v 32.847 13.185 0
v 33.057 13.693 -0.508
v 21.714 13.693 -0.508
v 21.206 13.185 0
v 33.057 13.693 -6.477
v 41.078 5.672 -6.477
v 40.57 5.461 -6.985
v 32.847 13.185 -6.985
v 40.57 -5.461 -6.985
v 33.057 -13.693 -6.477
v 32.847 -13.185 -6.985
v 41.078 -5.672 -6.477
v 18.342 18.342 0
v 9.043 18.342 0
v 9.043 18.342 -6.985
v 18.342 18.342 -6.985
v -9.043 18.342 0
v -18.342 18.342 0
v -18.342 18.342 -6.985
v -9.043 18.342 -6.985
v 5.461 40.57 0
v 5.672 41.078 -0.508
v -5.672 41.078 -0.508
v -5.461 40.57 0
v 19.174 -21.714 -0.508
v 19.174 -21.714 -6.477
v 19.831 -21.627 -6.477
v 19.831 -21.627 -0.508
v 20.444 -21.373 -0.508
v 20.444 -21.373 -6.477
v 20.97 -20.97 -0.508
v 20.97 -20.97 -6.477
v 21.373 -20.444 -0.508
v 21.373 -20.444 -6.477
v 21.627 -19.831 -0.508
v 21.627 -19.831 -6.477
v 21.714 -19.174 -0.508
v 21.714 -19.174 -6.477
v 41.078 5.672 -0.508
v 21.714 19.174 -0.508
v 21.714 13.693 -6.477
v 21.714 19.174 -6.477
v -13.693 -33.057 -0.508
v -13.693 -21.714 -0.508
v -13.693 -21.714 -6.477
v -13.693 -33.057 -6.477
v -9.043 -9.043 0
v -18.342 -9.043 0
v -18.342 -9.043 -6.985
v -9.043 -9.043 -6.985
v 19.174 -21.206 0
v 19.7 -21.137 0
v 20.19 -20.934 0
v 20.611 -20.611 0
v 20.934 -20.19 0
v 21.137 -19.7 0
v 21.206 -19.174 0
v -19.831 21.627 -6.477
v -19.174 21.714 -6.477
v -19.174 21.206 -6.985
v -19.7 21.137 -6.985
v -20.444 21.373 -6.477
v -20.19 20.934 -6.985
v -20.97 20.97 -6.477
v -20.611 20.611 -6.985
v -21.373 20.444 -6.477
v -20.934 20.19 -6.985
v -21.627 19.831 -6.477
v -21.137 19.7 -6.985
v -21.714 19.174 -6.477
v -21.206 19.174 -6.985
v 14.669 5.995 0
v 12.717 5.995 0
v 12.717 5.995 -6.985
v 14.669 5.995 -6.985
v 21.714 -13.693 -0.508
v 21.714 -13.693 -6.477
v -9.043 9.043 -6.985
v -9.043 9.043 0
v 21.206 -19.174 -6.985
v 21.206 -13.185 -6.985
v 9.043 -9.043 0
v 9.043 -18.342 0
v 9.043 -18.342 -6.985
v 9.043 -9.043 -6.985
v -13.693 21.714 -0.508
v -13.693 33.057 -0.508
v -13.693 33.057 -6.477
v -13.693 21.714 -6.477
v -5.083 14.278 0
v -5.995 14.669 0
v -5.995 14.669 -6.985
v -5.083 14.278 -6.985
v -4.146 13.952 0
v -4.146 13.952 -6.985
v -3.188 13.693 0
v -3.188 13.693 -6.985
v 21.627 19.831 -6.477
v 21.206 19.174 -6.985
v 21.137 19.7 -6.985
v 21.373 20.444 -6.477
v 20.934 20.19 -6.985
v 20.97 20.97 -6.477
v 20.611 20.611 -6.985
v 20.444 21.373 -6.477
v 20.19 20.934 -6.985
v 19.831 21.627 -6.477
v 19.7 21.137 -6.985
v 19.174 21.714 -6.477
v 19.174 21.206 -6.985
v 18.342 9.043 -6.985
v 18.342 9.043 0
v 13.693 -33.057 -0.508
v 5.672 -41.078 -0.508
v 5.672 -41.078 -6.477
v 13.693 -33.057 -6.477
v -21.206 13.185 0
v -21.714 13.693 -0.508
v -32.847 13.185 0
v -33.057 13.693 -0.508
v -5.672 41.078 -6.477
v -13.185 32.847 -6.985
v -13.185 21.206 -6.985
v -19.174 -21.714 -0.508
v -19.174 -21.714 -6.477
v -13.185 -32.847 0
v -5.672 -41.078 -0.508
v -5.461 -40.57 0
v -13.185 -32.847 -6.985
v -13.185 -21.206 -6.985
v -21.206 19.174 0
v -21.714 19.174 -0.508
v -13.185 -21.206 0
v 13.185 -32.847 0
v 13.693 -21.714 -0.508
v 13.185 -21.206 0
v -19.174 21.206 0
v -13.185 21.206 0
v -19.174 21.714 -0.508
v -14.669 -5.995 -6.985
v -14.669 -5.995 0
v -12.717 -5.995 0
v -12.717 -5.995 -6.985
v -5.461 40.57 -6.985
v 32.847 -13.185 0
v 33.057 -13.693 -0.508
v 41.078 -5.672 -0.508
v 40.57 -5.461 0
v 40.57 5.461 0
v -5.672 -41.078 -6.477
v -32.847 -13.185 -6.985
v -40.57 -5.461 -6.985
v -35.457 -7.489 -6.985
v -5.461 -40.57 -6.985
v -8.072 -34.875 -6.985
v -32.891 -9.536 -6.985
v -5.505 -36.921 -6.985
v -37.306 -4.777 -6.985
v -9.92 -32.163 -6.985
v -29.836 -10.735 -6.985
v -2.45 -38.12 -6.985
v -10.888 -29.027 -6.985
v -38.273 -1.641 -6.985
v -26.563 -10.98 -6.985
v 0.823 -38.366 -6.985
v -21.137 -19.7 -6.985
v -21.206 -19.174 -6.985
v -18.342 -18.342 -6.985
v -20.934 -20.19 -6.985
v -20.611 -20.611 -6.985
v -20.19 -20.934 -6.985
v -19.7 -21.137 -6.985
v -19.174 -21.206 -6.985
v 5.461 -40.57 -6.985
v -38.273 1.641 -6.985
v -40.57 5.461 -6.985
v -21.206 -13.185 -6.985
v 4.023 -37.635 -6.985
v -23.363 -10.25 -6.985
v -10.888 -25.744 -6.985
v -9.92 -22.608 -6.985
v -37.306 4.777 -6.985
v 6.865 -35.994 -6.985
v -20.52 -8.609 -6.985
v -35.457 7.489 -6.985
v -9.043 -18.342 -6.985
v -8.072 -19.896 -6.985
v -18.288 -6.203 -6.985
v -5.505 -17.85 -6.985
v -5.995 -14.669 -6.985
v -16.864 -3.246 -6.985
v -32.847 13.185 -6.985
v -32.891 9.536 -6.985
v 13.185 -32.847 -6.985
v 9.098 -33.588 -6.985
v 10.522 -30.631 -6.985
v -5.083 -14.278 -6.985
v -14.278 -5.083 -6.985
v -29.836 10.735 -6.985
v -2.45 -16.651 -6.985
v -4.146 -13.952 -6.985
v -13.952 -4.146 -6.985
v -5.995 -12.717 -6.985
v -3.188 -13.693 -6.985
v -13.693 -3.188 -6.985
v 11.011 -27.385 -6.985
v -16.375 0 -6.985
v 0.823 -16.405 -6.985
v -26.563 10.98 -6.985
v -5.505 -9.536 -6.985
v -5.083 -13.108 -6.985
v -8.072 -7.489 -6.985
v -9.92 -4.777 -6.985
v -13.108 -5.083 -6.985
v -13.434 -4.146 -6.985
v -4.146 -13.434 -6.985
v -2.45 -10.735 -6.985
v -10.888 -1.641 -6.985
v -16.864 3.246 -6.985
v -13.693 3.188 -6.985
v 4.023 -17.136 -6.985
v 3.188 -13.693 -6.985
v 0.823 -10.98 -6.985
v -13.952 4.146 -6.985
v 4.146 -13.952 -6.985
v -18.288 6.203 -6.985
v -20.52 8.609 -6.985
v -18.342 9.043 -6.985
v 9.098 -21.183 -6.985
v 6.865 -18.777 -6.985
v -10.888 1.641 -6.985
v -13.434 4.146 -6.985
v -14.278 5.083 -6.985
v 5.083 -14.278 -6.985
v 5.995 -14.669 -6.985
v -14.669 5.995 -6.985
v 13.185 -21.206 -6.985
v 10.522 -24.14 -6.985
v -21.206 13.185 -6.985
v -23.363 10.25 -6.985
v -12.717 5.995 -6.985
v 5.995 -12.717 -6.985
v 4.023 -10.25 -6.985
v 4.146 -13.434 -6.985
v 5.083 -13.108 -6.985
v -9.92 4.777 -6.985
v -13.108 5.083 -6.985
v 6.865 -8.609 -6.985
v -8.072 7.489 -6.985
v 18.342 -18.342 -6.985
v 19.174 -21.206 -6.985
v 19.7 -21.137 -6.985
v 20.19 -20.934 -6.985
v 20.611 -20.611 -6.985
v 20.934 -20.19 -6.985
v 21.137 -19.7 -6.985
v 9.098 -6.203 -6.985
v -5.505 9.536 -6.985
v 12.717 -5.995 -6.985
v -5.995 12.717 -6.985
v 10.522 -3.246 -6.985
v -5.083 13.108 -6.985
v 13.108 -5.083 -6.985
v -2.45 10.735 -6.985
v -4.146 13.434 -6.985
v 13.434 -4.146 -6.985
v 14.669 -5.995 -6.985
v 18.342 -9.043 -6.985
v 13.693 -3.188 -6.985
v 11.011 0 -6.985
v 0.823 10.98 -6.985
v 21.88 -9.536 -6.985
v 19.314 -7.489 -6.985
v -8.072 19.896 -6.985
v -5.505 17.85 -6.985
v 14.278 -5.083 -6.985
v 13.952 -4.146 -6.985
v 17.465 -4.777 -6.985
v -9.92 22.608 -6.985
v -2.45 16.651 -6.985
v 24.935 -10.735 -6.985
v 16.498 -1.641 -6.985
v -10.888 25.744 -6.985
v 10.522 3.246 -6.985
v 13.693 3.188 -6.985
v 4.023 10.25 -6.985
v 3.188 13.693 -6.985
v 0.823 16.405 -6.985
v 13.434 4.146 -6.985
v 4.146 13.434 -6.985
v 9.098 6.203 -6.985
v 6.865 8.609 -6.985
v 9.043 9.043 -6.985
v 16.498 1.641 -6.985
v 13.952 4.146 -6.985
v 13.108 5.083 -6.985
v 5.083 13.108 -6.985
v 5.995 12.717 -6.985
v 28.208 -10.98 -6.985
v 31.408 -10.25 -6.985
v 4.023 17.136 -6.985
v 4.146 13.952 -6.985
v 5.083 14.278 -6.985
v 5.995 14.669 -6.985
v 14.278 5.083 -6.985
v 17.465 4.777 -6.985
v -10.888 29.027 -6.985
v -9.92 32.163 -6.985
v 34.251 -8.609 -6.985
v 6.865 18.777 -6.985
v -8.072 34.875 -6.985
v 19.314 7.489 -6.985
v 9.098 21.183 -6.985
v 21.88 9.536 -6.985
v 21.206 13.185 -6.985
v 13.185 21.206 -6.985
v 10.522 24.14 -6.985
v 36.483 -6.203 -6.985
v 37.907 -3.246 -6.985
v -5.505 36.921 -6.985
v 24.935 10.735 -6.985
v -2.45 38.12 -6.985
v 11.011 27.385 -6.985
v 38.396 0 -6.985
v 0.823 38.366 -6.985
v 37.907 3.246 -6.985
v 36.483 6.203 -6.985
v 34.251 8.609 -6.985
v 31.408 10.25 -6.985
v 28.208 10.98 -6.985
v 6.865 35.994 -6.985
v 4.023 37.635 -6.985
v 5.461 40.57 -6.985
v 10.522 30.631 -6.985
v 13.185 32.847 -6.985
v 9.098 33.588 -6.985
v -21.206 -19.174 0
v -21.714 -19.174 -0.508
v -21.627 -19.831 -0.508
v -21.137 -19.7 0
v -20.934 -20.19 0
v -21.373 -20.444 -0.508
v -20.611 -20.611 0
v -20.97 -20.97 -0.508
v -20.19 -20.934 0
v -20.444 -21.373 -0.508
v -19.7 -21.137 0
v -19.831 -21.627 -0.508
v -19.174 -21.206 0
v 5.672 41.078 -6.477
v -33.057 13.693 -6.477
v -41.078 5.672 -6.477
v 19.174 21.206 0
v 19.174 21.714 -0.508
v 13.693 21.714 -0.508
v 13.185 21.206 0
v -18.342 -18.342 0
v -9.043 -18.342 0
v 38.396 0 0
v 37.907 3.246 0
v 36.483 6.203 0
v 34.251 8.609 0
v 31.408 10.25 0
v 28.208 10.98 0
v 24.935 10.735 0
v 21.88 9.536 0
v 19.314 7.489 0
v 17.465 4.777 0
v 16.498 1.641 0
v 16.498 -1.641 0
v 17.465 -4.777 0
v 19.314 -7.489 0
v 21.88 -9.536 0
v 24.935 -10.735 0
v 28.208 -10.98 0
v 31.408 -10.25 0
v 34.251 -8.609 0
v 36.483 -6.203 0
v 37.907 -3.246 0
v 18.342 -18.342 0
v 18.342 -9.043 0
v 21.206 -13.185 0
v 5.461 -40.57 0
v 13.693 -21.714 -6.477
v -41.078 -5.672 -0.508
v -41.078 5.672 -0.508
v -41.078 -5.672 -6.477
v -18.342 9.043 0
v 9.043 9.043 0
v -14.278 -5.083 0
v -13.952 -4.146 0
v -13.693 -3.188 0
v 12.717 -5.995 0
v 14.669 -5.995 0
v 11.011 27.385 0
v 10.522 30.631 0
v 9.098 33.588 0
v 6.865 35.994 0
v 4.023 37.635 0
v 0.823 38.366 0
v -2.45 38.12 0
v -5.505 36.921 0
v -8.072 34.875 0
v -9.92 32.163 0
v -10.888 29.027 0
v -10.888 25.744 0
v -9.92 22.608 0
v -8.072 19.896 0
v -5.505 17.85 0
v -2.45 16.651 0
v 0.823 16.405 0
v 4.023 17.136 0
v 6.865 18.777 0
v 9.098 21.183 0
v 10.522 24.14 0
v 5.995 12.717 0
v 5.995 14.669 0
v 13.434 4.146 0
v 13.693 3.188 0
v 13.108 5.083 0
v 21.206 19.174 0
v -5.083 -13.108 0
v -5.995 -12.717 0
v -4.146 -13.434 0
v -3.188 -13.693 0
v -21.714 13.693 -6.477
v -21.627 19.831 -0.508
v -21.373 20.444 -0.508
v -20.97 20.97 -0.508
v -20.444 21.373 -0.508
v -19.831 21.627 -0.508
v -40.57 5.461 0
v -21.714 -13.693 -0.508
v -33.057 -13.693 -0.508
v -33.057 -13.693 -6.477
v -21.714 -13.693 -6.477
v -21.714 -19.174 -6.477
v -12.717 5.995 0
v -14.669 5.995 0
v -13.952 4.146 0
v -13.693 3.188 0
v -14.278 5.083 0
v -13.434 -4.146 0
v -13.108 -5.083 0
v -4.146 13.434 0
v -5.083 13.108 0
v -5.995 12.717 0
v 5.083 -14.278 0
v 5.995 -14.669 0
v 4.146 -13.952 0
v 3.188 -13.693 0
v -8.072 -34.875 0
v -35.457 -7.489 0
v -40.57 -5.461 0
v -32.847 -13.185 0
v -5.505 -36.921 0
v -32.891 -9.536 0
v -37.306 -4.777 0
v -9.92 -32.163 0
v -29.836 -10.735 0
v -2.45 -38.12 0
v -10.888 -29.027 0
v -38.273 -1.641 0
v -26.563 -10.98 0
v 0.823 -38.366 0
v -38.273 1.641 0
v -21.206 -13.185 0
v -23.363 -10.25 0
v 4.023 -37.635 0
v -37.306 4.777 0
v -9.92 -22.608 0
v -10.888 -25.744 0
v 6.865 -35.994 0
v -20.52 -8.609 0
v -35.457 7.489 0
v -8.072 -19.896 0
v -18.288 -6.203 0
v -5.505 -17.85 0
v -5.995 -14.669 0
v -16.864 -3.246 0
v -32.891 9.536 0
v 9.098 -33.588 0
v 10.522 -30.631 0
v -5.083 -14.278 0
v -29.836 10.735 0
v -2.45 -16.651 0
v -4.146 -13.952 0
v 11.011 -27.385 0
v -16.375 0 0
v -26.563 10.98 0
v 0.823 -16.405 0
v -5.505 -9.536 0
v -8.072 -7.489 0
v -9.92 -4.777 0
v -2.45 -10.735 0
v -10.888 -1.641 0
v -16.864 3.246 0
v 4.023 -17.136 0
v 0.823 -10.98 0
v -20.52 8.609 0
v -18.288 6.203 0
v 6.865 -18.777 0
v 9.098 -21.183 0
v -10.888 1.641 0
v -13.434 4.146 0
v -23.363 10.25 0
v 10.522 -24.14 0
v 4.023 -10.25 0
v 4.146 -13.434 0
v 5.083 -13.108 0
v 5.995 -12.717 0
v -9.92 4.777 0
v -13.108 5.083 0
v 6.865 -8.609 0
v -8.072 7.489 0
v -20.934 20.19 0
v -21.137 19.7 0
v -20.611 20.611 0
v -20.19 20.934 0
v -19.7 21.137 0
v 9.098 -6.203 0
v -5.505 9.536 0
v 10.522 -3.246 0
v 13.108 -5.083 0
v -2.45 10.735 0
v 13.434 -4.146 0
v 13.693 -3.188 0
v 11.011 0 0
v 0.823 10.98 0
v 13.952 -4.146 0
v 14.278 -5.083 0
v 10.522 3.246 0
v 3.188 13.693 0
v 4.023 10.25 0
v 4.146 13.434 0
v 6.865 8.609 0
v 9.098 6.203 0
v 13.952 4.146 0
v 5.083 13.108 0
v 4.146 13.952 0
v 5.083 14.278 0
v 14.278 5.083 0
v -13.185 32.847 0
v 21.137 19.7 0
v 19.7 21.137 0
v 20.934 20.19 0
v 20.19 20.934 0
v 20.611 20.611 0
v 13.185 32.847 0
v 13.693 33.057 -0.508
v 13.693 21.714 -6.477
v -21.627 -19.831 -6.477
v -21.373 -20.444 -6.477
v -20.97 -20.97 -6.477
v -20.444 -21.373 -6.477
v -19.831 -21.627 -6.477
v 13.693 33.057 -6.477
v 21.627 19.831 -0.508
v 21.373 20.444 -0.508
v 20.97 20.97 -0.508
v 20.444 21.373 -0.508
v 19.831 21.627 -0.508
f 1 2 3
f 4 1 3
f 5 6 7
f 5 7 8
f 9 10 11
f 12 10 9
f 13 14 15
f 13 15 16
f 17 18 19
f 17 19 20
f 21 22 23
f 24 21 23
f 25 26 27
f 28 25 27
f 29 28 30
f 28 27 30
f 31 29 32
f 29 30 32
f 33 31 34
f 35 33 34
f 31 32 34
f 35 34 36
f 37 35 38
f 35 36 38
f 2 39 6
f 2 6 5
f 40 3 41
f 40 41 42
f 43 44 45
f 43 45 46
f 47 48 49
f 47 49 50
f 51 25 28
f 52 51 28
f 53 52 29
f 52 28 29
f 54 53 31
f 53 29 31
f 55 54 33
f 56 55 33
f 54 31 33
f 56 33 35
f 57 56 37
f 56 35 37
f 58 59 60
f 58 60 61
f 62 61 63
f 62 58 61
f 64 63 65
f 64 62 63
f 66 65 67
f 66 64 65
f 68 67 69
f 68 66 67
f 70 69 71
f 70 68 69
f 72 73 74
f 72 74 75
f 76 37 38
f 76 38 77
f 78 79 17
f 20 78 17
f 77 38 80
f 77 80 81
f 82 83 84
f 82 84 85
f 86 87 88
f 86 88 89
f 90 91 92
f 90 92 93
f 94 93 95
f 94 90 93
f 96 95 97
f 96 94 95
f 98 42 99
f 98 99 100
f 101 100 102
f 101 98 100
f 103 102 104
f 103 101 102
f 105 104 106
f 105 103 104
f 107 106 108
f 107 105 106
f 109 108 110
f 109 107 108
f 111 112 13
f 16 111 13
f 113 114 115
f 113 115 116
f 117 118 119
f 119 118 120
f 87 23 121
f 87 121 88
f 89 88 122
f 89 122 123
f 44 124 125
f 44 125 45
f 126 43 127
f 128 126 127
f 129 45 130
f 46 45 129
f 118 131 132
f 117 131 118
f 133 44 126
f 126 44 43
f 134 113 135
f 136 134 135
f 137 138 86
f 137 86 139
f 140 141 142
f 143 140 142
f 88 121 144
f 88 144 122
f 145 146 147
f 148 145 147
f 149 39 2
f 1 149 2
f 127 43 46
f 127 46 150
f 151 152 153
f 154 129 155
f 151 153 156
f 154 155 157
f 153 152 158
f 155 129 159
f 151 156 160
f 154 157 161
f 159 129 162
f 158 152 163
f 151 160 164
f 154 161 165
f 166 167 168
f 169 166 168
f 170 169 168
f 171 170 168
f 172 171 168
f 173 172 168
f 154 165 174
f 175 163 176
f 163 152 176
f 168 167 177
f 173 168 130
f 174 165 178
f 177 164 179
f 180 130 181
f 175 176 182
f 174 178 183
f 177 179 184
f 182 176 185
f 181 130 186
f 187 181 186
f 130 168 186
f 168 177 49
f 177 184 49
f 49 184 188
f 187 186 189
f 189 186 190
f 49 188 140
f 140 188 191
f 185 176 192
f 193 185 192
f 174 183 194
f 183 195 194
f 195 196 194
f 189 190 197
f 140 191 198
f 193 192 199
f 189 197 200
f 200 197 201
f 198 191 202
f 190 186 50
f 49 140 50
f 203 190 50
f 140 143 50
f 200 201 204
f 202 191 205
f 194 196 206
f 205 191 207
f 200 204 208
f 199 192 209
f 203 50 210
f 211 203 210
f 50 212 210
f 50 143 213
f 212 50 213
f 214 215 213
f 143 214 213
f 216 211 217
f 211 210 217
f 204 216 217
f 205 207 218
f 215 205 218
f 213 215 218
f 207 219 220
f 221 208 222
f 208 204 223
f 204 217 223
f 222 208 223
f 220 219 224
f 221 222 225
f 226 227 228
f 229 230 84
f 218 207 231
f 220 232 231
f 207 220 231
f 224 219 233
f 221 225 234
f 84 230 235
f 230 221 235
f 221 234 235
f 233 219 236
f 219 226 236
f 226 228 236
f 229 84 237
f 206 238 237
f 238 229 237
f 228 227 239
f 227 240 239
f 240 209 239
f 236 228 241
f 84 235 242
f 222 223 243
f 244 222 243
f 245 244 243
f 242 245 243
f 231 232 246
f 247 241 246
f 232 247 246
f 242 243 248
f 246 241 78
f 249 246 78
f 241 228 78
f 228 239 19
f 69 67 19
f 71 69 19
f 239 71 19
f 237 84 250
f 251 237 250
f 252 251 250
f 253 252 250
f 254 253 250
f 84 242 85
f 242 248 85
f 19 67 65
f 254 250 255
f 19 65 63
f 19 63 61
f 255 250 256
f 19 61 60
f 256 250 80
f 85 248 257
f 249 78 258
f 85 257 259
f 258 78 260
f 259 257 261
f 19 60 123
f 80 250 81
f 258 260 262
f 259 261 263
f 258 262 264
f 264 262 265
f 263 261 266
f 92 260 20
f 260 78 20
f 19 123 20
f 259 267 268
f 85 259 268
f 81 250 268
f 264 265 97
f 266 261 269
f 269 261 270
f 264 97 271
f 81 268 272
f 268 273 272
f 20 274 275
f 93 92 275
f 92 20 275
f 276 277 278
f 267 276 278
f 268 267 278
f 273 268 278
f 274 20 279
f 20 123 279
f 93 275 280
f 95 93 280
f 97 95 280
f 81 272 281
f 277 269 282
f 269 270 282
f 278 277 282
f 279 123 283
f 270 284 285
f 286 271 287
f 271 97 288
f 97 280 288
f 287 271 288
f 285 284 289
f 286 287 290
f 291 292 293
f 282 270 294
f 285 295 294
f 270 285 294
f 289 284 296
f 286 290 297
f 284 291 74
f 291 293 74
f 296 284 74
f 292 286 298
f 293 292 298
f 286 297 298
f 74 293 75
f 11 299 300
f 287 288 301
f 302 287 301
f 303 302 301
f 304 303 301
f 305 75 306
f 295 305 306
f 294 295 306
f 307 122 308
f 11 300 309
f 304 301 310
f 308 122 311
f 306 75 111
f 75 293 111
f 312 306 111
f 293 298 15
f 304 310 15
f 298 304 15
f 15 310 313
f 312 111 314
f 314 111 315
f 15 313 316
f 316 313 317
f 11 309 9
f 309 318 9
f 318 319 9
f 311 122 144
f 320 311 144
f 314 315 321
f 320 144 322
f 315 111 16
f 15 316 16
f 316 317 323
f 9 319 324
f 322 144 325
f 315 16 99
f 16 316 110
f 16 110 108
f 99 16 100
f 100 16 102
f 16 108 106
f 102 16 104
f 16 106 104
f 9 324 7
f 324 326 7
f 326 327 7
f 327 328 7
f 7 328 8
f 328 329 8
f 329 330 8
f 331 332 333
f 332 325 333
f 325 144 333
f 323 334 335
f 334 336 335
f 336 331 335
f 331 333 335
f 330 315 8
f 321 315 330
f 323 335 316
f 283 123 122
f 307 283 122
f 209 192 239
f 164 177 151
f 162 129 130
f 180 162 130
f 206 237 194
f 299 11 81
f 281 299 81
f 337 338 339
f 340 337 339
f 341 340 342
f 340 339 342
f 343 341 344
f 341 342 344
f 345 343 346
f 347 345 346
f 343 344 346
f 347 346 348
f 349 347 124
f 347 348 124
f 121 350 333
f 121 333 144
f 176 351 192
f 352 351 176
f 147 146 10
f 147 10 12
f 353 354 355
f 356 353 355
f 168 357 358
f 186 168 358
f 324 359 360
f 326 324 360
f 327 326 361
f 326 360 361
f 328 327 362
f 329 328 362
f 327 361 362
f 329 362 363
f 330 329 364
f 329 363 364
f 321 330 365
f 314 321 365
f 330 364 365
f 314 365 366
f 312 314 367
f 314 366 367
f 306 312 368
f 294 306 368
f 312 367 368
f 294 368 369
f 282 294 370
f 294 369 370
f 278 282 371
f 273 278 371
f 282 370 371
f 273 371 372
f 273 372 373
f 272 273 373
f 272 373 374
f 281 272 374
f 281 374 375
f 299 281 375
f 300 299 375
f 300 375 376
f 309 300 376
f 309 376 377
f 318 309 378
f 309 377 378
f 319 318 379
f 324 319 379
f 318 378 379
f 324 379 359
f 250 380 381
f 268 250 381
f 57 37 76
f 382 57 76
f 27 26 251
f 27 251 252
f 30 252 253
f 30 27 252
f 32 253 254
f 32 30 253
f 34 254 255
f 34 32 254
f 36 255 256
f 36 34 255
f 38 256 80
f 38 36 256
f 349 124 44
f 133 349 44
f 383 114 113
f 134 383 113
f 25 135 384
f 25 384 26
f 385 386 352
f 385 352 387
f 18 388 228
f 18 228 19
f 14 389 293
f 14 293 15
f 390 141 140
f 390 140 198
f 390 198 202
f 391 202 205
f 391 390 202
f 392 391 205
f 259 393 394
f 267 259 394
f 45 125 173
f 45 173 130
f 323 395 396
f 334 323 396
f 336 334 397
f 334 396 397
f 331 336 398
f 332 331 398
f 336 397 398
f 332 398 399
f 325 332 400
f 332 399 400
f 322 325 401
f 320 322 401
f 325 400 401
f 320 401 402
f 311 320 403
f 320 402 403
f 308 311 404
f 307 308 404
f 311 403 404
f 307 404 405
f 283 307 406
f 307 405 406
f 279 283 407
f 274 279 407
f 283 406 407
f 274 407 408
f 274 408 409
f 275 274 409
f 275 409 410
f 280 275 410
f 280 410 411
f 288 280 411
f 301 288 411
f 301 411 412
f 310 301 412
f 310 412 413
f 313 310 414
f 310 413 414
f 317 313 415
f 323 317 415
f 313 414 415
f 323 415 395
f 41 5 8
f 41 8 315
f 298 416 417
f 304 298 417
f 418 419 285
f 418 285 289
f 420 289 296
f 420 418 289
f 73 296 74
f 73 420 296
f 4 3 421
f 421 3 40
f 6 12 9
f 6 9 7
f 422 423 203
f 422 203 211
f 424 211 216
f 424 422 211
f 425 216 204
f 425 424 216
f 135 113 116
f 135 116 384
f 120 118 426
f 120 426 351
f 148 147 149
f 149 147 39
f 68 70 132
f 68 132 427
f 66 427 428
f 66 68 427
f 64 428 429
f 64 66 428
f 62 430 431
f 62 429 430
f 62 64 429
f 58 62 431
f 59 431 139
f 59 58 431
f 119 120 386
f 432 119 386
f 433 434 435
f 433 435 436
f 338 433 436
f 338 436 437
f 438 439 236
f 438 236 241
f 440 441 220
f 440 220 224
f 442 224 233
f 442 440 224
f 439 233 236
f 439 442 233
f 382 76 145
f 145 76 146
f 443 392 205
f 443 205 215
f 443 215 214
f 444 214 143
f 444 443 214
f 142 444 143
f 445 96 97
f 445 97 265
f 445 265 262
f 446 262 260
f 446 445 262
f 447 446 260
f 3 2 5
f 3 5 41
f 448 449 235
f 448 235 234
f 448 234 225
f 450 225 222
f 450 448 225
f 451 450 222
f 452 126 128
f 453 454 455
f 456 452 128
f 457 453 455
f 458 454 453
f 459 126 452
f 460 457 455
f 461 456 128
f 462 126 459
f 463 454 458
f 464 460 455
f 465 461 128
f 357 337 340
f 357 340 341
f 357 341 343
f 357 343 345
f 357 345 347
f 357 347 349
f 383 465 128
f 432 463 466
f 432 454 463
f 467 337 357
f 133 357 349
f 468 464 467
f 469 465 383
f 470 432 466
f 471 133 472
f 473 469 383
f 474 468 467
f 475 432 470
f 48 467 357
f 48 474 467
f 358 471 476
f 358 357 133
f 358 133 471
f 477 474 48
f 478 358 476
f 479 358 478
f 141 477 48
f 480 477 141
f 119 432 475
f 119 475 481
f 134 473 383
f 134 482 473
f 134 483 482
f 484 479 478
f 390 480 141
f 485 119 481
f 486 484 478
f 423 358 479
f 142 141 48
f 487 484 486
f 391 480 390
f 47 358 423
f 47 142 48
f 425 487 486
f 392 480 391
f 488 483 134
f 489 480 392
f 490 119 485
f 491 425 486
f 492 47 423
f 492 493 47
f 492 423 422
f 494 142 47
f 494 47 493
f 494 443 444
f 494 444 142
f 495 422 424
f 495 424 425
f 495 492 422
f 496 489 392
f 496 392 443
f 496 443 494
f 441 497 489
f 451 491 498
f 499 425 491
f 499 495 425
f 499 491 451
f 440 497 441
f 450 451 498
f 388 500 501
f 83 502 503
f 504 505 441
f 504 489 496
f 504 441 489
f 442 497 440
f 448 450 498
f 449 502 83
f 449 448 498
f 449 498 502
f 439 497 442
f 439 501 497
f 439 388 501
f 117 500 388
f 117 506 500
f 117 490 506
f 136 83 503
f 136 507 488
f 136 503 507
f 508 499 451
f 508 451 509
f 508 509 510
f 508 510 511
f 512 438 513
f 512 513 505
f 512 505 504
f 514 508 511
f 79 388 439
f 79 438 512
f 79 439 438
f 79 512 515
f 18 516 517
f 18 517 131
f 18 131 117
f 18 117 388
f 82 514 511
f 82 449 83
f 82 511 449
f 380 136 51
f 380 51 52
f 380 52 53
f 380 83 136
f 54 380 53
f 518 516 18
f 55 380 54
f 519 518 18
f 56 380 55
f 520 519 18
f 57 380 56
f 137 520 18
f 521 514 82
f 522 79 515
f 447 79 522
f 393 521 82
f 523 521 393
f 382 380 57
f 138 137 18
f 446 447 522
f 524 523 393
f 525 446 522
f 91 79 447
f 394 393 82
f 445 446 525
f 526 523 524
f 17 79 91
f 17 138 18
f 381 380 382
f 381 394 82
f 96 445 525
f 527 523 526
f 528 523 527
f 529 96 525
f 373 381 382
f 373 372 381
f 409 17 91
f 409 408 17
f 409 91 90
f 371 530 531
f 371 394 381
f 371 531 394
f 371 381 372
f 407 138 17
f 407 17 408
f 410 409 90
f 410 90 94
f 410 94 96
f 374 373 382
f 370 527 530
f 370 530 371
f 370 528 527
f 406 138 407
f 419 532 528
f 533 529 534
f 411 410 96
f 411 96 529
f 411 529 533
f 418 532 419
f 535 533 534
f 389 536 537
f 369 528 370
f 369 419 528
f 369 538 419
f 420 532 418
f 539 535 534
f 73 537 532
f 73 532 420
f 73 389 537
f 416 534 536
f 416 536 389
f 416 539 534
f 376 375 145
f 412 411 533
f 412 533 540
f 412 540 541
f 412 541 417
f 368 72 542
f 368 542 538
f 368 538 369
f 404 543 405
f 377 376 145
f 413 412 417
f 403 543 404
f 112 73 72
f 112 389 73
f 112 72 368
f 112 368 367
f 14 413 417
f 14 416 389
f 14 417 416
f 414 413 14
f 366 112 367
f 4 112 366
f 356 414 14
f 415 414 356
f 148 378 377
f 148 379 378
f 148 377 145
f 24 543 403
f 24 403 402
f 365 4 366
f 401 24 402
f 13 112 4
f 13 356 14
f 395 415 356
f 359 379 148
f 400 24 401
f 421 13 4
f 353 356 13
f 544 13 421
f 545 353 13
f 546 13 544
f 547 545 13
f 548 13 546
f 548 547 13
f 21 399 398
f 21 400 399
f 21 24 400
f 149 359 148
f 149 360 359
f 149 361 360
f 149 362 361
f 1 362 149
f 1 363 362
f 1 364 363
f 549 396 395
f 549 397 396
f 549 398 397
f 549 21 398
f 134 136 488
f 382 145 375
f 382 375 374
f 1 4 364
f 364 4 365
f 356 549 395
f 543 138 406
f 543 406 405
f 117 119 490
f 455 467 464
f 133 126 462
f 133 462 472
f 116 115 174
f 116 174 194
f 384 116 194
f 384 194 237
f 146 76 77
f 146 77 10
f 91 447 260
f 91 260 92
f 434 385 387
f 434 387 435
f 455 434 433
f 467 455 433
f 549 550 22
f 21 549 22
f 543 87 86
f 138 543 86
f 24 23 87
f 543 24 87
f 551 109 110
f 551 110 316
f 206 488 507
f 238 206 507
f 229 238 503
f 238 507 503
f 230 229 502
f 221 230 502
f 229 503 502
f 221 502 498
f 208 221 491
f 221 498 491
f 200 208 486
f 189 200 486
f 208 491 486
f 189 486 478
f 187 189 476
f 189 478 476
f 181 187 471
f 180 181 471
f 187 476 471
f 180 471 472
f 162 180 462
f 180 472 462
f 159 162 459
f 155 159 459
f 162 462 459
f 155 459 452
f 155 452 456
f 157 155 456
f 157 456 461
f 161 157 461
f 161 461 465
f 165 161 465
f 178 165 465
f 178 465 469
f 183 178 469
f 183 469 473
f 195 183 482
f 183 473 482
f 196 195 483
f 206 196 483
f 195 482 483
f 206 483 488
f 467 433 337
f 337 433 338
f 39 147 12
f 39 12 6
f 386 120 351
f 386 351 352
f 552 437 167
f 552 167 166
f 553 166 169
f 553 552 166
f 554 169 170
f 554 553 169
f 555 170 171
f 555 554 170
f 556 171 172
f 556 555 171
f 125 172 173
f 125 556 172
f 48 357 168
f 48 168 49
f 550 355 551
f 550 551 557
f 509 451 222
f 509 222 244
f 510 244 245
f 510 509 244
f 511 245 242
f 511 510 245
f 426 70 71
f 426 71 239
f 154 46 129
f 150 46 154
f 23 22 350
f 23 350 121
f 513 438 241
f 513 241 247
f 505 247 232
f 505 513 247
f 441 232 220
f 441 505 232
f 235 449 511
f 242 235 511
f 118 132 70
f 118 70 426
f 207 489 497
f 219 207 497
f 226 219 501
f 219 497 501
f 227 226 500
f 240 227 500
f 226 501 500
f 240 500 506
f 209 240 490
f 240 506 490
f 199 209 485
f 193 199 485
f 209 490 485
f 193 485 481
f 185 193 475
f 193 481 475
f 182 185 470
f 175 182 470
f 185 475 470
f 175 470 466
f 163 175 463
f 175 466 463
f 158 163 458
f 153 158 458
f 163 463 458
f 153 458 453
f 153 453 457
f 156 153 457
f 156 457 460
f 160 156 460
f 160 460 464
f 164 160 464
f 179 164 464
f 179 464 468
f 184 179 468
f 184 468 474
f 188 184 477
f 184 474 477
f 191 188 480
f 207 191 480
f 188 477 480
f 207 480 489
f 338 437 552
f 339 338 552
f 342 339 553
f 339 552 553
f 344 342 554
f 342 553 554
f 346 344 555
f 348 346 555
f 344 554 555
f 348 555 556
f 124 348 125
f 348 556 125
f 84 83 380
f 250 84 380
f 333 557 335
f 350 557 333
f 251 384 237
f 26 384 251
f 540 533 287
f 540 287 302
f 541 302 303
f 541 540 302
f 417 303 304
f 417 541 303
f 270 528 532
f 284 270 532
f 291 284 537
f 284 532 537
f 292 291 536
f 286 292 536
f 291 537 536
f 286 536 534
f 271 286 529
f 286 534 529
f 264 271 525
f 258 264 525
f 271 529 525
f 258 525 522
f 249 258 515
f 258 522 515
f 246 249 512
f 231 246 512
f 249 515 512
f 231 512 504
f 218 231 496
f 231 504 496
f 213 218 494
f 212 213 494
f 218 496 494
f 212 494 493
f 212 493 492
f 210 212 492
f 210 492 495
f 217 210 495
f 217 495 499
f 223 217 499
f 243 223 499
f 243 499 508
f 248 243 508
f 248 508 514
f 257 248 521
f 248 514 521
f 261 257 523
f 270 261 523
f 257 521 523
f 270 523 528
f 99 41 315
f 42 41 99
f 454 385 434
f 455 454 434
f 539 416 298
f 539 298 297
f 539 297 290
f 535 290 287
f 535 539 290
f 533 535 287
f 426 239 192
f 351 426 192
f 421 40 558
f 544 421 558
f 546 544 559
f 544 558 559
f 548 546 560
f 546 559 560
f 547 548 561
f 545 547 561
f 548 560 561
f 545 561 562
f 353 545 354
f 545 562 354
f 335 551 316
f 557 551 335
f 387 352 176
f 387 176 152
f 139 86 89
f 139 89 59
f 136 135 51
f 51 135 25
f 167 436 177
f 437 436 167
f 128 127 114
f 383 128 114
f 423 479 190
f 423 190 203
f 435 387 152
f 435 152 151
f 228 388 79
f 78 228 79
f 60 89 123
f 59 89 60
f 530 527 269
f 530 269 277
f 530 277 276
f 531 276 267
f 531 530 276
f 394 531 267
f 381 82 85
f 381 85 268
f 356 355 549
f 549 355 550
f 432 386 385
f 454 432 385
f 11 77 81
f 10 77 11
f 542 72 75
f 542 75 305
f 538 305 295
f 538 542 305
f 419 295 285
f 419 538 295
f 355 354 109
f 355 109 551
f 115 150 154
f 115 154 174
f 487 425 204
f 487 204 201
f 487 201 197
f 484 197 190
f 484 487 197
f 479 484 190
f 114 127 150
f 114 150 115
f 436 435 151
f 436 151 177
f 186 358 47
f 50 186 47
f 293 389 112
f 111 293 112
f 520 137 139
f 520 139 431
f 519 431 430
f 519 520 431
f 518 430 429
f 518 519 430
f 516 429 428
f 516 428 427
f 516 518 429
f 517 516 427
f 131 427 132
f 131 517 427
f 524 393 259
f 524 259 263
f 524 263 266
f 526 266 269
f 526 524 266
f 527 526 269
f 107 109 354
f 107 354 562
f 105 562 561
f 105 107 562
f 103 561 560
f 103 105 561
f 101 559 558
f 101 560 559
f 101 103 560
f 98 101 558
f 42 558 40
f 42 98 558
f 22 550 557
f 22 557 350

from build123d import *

# Parameters (mm, degrees)
F0_R         = 11.0109
F1_DEPTH     = 6.985
F2_W         = 9.299216499
F2_H         = 9.299216499
F3_DEPTH     = 25.4
F4_R         = 2.54
F5_SIZE      = 0.508
F6_SIZE      = 0.508
F7_T         = 3.048
F7_T3_DEPTH  = 12.065
F7_T5_DEPTH  = 6.9758818102
F7_T7_DEPTH  = 6.9758818102
F7_T9_DEPTH  = 6.9758818102
F7_T11_DEPTH = 6.9758818102
F7_T13_DEPTH = 6.9758818102
F7_T15_DEPTH = 13.081
F7_T17_DEPTH = 6.9758818102
F7_T19_DEPTH = 6.9758818102
F7_T21_DEPTH = 6.9758818102


# Not quite as in the source:
# - a shell that OpenCascade refuses in one call is made with other operations: the cavity is built on its own and cut out


with BuildPart() as f1:
    # F0 (on Top) → F1 (new body)
    with BuildSketch(Plane.XY):
        Polygon((-13.6927261634, 5.6717128827), (-13.6927261634, -5.6717128827), (-21.7137394441, -13.6927261634), (-21.7137394441, -21.7137394441), (-13.6927261634, -21.7137394441), (-5.6717128827, -13.6927261634), (5.6717128827, -13.6927261634), (13.6927261634, -21.7137394441), (21.7137394441, -21.7137394441), (21.7137394441, -13.6927261634), (13.6927261634, -5.6717128827), (13.6927261634, 5.6717128827), (21.7137394441, 13.6927261634), (21.7137394441, 21.7137394441), (13.6927261634, 21.7137394441), (5.6717128827, 13.6927261634), (-5.6717128827, 13.6927261634), (-13.6927261634, 21.7137394441), (-21.7137394441, 21.7137394441), (-21.7137394441, 13.6927261634), align=None)
        Circle(F0_R, mode=Mode.SUBTRACT)
        Polygon((-21.7137394441, -13.6927261634), (-13.6927261634, -5.6717128827), (-13.6927261634, 5.6717128827), (-21.7137394441, 13.6927261634), (-33.0571652095, 13.6927261634), (-41.0781784902, 5.6717128827), (-41.0781784902, -5.6717128827), (-33.0571652095, -13.6927261634), align=None)
        with Locations((-27.3854523268, 0)):
            Circle(F0_R, mode=Mode.SUBTRACT)
        Polygon((-5.6717128827, -13.6927261634), (-13.6927261634, -21.7137394441), (-13.6927261634, -33.0571652095), (-5.6717128827, -41.0781784902), (5.6717128827, -41.0781784902), (13.6927261634, -33.0571652095), (13.6927261634, -21.7137394441), (5.6717128827, -13.6927261634), align=None)
        with Locations((0, -27.3854523268)):
            Circle(F0_R, mode=Mode.SUBTRACT)
        Polygon((-13.6927261634, 33.0571652095), (-13.6927261634, 21.7137394441), (-5.6717128827, 13.6927261634), (5.6717128827, 13.6927261634), (13.6927261634, 21.7137394441), (13.6927261634, 33.0571652095), (5.6717128827, 41.0781784902), (-5.6717128827, 41.0781784902), align=None)
        with Locations((0, 27.3854523268)):
            Circle(F0_R, mode=Mode.SUBTRACT)
        Polygon((13.6927261634, -5.6717128827), (21.7137394441, -13.6927261634), (33.0571652095, -13.6927261634), (41.0781784902, -5.6717128827), (41.0781784902, 5.6717128827), (33.0571652095, 13.6927261634), (21.7137394441, 13.6927261634), (13.6927261634, 5.6717128827), align=None)
        with Locations((27.3854523268, 0)):
            Circle(F0_R, mode=Mode.SUBTRACT)
    extrude(amount=-F1_DEPTH)

    # F2 (on Top) → F3 (cut)
    with BuildSketch(Plane.XY):
        with Locations((-13.6927261634, 13.6927261634)):
            Rectangle(F2_W, F2_H)
        with Locations((13.6927261634, 13.6927261634)):
            Rectangle(F2_W, F2_H)
        with Locations((13.6927261634, -13.6927261634)):
            Rectangle(F2_W, F2_H)
        with Locations((-13.6927261634, -13.6927261634)):
            Rectangle(F2_W, F2_H)
    extrude(amount=-F3_DEPTH, mode=Mode.SUBTRACT)

    # F4
    f4_edges = [f1.edges().sort_by_distance(p)[0] for p in [
        (-21.713739, 21.713739, -3.4925),
        (21.713739, 21.713739, -3.4925),
        (21.713739, -21.713739, -3.4925),
        (-21.713739, -21.713739, -3.4925),
    ]]
    fillet(f4_edges, radius=F4_R)

    # F5
    f5_edges = [f1.edges().sort_by_distance(p)[0] for p in [
        (41.078178, 0, -6.985),
        (37.067672, 9.68222, -6.985),
        (27.385452, 13.692726, -6.985),
        (21.713739, 16.433233, -6.985),
        (16.433233, 21.713739, -6.985),
        (13.692726, 27.385452, -6.985),
        (9.68222, 37.067672, -6.985),
        (0, 41.078178, -6.985),
        (-9.68222, 37.067672, -6.985),
        (-13.692726, 27.385452, -6.985),
        (-16.433233, 21.713739, -6.985),
        (37.067672, -9.68222, -6.985),
        (27.385452, -13.692726, -6.985),
        (21.713739, -16.433233, -6.985),
        (16.433233, -21.713739, -6.985),
        (13.692726, -27.385452, -6.985),
        (9.68222, -37.067672, -6.985),
        (0, -41.078178, -6.985),
        (-9.68222, -37.067672, -6.985),
        (-13.692726, -27.385452, -6.985),
        (-16.433233, -21.713739, -6.985),
        (-21.713739, -16.433233, -6.985),
        (-27.385452, -13.692726, -6.985),
        (-37.067672, -9.68222, -6.985),
        (-41.078178, 0, -6.985),
        (-37.067672, 9.68222, -6.985),
        (-27.385452, 13.692726, -6.985),
        (-21.713739, 16.433233, -6.985),
    ]]
    chamfer(f5_edges, length=F5_SIZE)

    # F6
    f6_edges = [f1.edges().sort_by_distance(p)[0] for p in [
        (9.68222, -37.067672, 0),
        (0, -41.078178, 0),
        (-9.68222, -37.067672, 0),
        (-13.692726, -27.385452, 0),
        (-16.433233, -21.713739, 0),
        (-21.713739, -16.433233, 0),
        (-27.385452, -13.692726, 0),
        (-37.067672, -9.68222, 0),
        (-27.385452, 13.692726, 0),
        (-37.067672, 9.68222, 0),
        (-41.078178, 0, 0),
        (-21.713739, 16.433233, 0),
        (-16.433233, 21.713739, 0),
        (-13.692726, 27.385452, 0),
        (-9.68222, 37.067672, 0),
        (0, 41.078178, 0),
        (9.68222, 37.067672, 0),
        (13.692726, 27.385452, 0),
        (16.433233, 21.713739, 0),
        (21.713739, 16.433233, 0),
        (27.385452, 13.692726, 0),
        (37.067672, 9.68222, 0),
        (41.078178, 0, 0),
        (37.067672, -9.68222, 0),
        (27.385452, -13.692726, 0),
        (21.713739, -16.433233, 0),
        (16.433233, -21.713739, 0),
        (13.692726, -27.385452, 0),
    ]]
    chamfer(f6_edges, length=F6_SIZE)

    # F7: shell of thickness 3.048, made by hand


with BuildPart() as f7_core1:
    # F7_t2: copy of F1
    add(f1.part)

    # the walls: a layer under each face that stays
    f7_faces = [f7_core1.faces().sort_by_distance(p)[0] for p in [
        (21.7137394441, 16.4332328037, -3.4925),
        (21.4597394441, 16.1792328037, -0.254),
        (21.4597394441, 16.1792328037, -6.731),
        (27.3854523268, 13.6927261634, -3.4925),
        (20.7901855458, 20.7901855458, -0.254),
        (20.7901855458, 20.7901855458, -6.731),
        (16.4332328037, 21.7137394441, -3.4925),
        (27.1314523268, 13.4387261634, -0.254),
        (27.1314523268, 13.4387261634, -6.731),
        (37.0676718499, 9.6822195231, -3.4925),
        (16.1792328037, 21.4597394441, -0.254),
        (16.1792328037, 21.4597394441, -6.731),
        (13.6927261634, 27.3854523268, -3.4925),
        (36.8880667274, 9.5026144006, -0.254),
        (9.5026144006, -36.8880667274, -0.254),
        (0, -40.8241784902, -0.254),
        (13.4387261634, -27.1314523268, -0.254),
        (-9.5026144006, -36.8880667274, -0.254),
        (16.1792328037, -21.4597394441, -0.254),
        (-13.4387261634, -27.1314523268, -0.254),
        (20.7901855458, -20.7901855458, -0.254),
        (-16.1792328037, -21.4597394441, -0.254),
        (21.4597394441, -16.1792328037, -0.254),
        (-20.7901855458, -20.7901855458, -0.254),
        (27.1314523268, -13.4387261634, -0.254),
        (-21.4597394441, -16.1792328037, -0.254),
        (36.8880667274, -9.5026144006, -0.254),
        (-27.1314523268, -13.4387261634, -0.254),
        (40.8241784902, 0, -0.254),
        (-36.8880667274, -9.5026144006, -0.254),
        (-40.8241784902, 0, -0.254),
        (-36.8880667274, 9.5026144006, -0.254),
        (-27.1314523268, 13.4387261634, -0.254),
        (-21.4597394441, 16.1792328037, -0.254),
        (-20.7901855458, 20.7901855458, -0.254),
        (13.4387261634, 27.1314523268, -0.254),
        (-16.1792328037, 21.4597394441, -0.254),
        (9.5026144006, 36.8880667274, -0.254),
        (-13.4387261634, 27.1314523268, -0.254),
        (0, 40.8241784902, -0.254),
        (-9.5026144006, 36.8880667274, -0.254),
        (-9.0431179139, -13.6927261634, -3.4925),
        (-13.6927261634, -9.0431179139, -3.4925),
        (-18.3423344129, -13.6927261634, -3.4925),
        (-13.6927261634, -18.3423344129, -3.4925),
        (-11.0109, -27.3854523268, -3.4925),
        (18.3423344129, -13.6927261634, -3.4925),
        (13.6927261634, -9.0431179139, -3.4925),
        (9.0431179139, -13.6927261634, -3.4925),
        (13.6927261634, -18.3423344129, -3.4925),
        (-38.3963523268, 0, -3.4925),
        (-13.6927261634, 18.3423344129, -3.4925),
        (-18.3423344129, 13.6927261634, -3.4925),
        (-13.6927261634, 9.0431179139, -3.4925),
        (-9.0431179139, 13.6927261634, -3.4925),
        (-11.0109, 0, -3.4925),
        (9.0431179139, 13.6927261634, -3.4925),
        (13.6927261634, 9.0431179139, -3.4925),
        (18.3423344129, 13.6927261634, -3.4925),
        (13.6927261634, 18.3423344129, -3.4925),
        (16.3745523268, 0, -3.4925),
        (-11.0109, 27.3854523268, -3.4925),
        (36.8880667274, 9.5026144006, -6.731),
        (40.8241784902, 0, -6.731),
        (36.8880667274, -9.5026144006, -6.731),
        (27.1314523268, -13.4387261634, -6.731),
        (21.4597394441, -16.1792328037, -6.731),
        (20.7901855458, -20.7901855458, -6.731),
        (16.1792328037, -21.4597394441, -6.731),
        (13.4387261634, -27.1314523268, -6.731),
        (13.4387261634, 27.1314523268, -6.731),
        (9.5026144006, -36.8880667274, -6.731),
        (9.5026144006, 36.8880667274, -6.731),
        (0, -40.8241784902, -6.731),
        (0, 40.8241784902, -6.731),
        (-9.5026144006, -36.8880667274, -6.731),
        (-9.5026144006, 36.8880667274, -6.731),
        (-13.4387261634, -27.1314523268, -6.731),
        (-13.4387261634, 27.1314523268, -6.731),
        (-16.1792328037, -21.4597394441, -6.731),
        (-16.1792328037, 21.4597394441, -6.731),
        (-20.7901855458, -20.7901855458, -6.731),
        (-20.7901855458, 20.7901855458, -6.731),
        (-21.4597394441, -16.1792328037, -6.731),
        (-21.4597394441, 16.1792328037, -6.731),
        (-27.1314523268, -13.4387261634, -6.731),
        (-27.1314523268, 13.4387261634, -6.731),
        (-36.8880667274, -9.5026144006, -6.731),
        (-36.8880667274, 9.5026144006, -6.731),
        (-40.8241784902, 0, -6.731),
        (41.0781784902, 0, -3.4925),
        (9.6822195231, 37.0676718499, -3.4925),
        (9.6822195231, -37.0676718499, -3.4925),
        (0, -41.0781784902, -3.4925),
        (13.6927261634, -27.3854523268, -3.4925),
        (-9.6822195231, -37.0676718499, -3.4925),
        (16.4332328037, -21.7137394441, -3.4925),
        (-13.6927261634, -27.3854523268, -3.4925),
        (-16.4332328037, -21.7137394441, -3.4925),
        (21.7137394441, -16.4332328037, -3.4925),
        (27.3854523268, -13.6927261634, -3.4925),
        (-21.7137394441, -16.4332328037, -3.4925),
        (37.0676718499, -9.6822195231, -3.4925),
        (-27.3854523268, -13.6927261634, -3.4925),
        (-37.0676718499, -9.6822195231, -3.4925),
        (-41.0781784902, 0, -3.4925),
        (-37.0676718499, 9.6822195231, -3.4925),
        (-27.3854523268, 13.6927261634, -3.4925),
        (-21.7137394441, 16.4332328037, -3.4925),
        (-16.4332328037, 21.7137394441, -3.4925),
        (-13.6927261634, 27.3854523268, -3.4925),
        (0, 41.0781784902, -3.4925),
        (-9.6822195231, 37.0676718499, -3.4925),
    ]]
    thicken(f7_faces, amount=-F7_T, mode=Mode.SUBTRACT)

    # F7_s4 → F7_t3 (cut)
    with BuildSketch(Plane.XY.offset(-9.525)):
        Polygon((21.7442194441, 13.7232061634), (18.6657394441, 13.6927261634), (18.6657394441, 10.6447261634), (21.7137394441, 10.6447261634), align=None)
        Polygon((13.7232061634, 21.7442194441), (13.6927261634, 18.6657394441), (10.6447261634, 18.6657394441), (10.6447261634, 21.7137394441), align=None)
        Polygon((13.7232061634, -21.7442194441), (10.6447261634, -21.7137394441), (10.6447261634, -18.6657394441), (13.6927261634, -18.6657394441), align=None)
        Polygon((-13.7232061634, -21.7442194441), (-10.6447261634, -21.7137394441), (-10.6447261634, -18.6657394441), (-13.6927261634, -18.6657394441), align=None)
        Polygon((21.7442194441, -13.7232061634), (18.6657394441, -13.6927261634), (18.6657394441, -10.6447261634), (21.7137394441, -10.6447261634), align=None)
        Polygon((-21.7442194441, -13.7232061634), (-18.6657394441, -13.6927261634), (-18.6657394441, -10.6447261634), (-21.7137394441, -10.6447261634), align=None)
        Polygon((-21.7442194441, 13.7232061634), (-21.7137394441, 10.6447261634), (-18.6657394441, 10.6447261634), (-18.6657394441, 13.6927261634), align=None)
        Polygon((-13.7232061634, 21.7442194441), (-13.6927261634, 18.6657394441), (-10.6447261634, 18.6657394441), (-10.6447261634, 21.7137394441), align=None)
    extrude(amount=F7_T3_DEPTH, mode=Mode.SUBTRACT)

    # F7_s6 → F7_t5 (cut)
    with BuildSketch(Plane(origin=(9.7037249153, 9.7037249153, -9.7037249153), x_dir=(-0.7071067812, 0.7071067812, 0), z_dir=(0.5773502692, 0.5773502692, -0.5773502692))):
        Polygon((-5.6717128827, 14.0926417011), (-4.1477128827, 11.4002033618), (-5.6717128827, 10.5203215515), (-7.1957128827, 11.4002033618), align=None)
        Polygon((5.6717128827, 14.0926417011), (4.1477128827, 11.4002033618), (5.6717128827, 10.5203215515), (7.1957128827, 11.4002033618), align=None)
    extrude(amount=F7_T5_DEPTH, mode=Mode.SUBTRACT)

    # F7_s8 → F7_t7 (cut)
    with BuildSketch(Plane(origin=(11.402918823, 11.402918823, 11.402918823), x_dir=(0.7071067812, -0.7071067812, 0), z_dir=(-0.5773502692, -0.5773502692, -0.5773502692))):
        Polygon((5.6717128827, -19.7958703189), (4.1477128827, -17.1034319795), (5.6717128827, -16.2235501693), (7.1957128827, -17.1034319795), align=None)
        Polygon((-5.6717128827, -19.7958703189), (-4.1477128827, -17.1034319795), (-5.6717128827, -16.2235501693), (-7.1957128827, -17.1034319795), align=None)
    extrude(amount=F7_T7_DEPTH, mode=Mode.SUBTRACT)

    # F7_s10 → F7_t9 (cut)
    with BuildSketch(Plane(origin=(9.7037249153, -9.7037249153, -9.7037249153), x_dir=(0.7071067812, 0.7071067812, 0), z_dir=(0.5773502692, -0.5773502692, -0.5773502692))):
        Polygon((-5.6717128827, 14.0926417011), (-7.1957128827, 11.4002033618), (-5.6717128827, 10.5203215515), (-4.1477128827, 11.4002033618), align=None)
        Polygon((5.6717128827, 14.0926417011), (4.1477128827, 11.4002033618), (5.6717128827, 10.5203215515), (7.1957128827, 11.4002033618), align=None)
    extrude(amount=F7_T9_DEPTH, mode=Mode.SUBTRACT)

    # F7_s12 → F7_t11 (cut)
    with BuildSketch(Plane(origin=(-9.7037249153, -9.7037249153, -9.7037249153), x_dir=(0.7071067812, -0.7071067812, 0), z_dir=(-0.5773502692, -0.5773502692, -0.5773502692))):
        Polygon((5.6717128827, 14.0926417011), (7.1957128827, 11.4002033618), (5.6717128827, 10.5203215515), (4.1477128827, 11.4002033618), align=None)
        Polygon((-5.6717128827, 14.0926417011), (-4.1477128827, 11.4002033618), (-5.6717128827, 10.5203215515), (-7.1957128827, 11.4002033618), align=None)
    extrude(amount=F7_T11_DEPTH, mode=Mode.SUBTRACT)

    # F7_s14 → F7_t13 (cut)
    with BuildSketch(Plane(origin=(-9.7037249153, 9.7037249153, -9.7037249153), x_dir=(-0.7071067812, -0.7071067812, 0), z_dir=(-0.5773502692, 0.5773502692, -0.5773502692))):
        Polygon((5.6717128827, 14.0926417011), (7.1957128827, 11.4002033618), (5.6717128827, 10.5203215515), (4.1477128827, 11.4002033618), align=None)
        Polygon((-5.6717128827, 14.0926417011), (-4.1477128827, 11.4002033618), (-5.6717128827, 10.5203215515), (-7.1957128827, 11.4002033618), align=None)
    extrude(amount=F7_T13_DEPTH, mode=Mode.SUBTRACT)

    # F7_s16 → F7_t15 (cut)
    with BuildSketch(Plane.XY.offset(-10.033)):
        Polygon((-9.0735979139, -9.0735979139), (-5.9951179139, -9.0431179139), (-5.9951179139, -5.9951179139), (-9.0431179139, -5.9951179139), align=None)
        Polygon((-9.0735979139, -18.3118544129), (-5.9951179139, -18.3423344129), (-5.9951179139, -21.3903344129), (-9.0431179139, -21.3903344129), align=None)
        Polygon((-18.3118544129, -9.0735979139), (-18.3423344129, -5.9951179139), (-21.3903344129, -5.9951179139), (-21.3903344129, -9.0431179139), align=None)
        Polygon((-18.3118544129, -18.3118544129), (-21.3903344129, -18.3423344129), (-21.3903344129, -21.3903344129), (-18.3423344129, -21.3903344129), align=None)
        Polygon((18.3118544129, -9.0735979139), (21.3903344129, -9.0431179139), (21.3903344129, -5.9951179139), (18.3423344129, -5.9951179139), align=None)
        Polygon((18.3118544129, -18.3118544129), (21.3903344129, -18.3423344129), (21.3903344129, -21.3903344129), (18.3423344129, -21.3903344129), align=None)
        Polygon((9.0735979139, -9.0735979139), (9.0431179139, -5.9951179139), (5.9951179139, -5.9951179139), (5.9951179139, -9.0431179139), align=None)
        Polygon((9.0735979139, -18.3118544129), (5.9951179139, -18.3423344129), (5.9951179139, -21.3903344129), (9.0431179139, -21.3903344129), align=None)
        Polygon((-18.3118544129, 18.3118544129), (-18.3423344129, 21.3903344129), (-21.3903344129, 21.3903344129), (-21.3903344129, 18.3423344129), align=None)
        Polygon((-9.0735979139, 18.3118544129), (-9.0431179139, 21.3903344129), (-5.9951179139, 21.3903344129), (-5.9951179139, 18.3423344129), align=None)
        Polygon((-18.3118544129, 9.0735979139), (-21.3903344129, 9.0431179139), (-21.3903344129, 5.9951179139), (-18.3423344129, 5.9951179139), align=None)
        Polygon((-9.0735979139, 9.0735979139), (-9.0431179139, 5.9951179139), (-5.9951179139, 5.9951179139), (-5.9951179139, 9.0431179139), align=None)
        Polygon((9.0735979139, 9.0735979139), (5.9951179139, 9.0431179139), (5.9951179139, 5.9951179139), (9.0431179139, 5.9951179139), align=None)
        Polygon((9.0735979139, 18.3118544129), (5.9951179139, 18.3423344129), (5.9951179139, 21.3903344129), (9.0431179139, 21.3903344129), align=None)
        Polygon((18.3118544129, 9.0735979139), (18.3423344129, 5.9951179139), (21.3903344129, 5.9951179139), (21.3903344129, 9.0431179139), align=None)
        Polygon((18.3118544129, 18.3118544129), (21.3903344129, 18.3423344129), (21.3903344129, 21.3903344129), (18.3423344129, 21.3903344129), align=None)
    extrude(amount=F7_T15_DEPTH, mode=Mode.SUBTRACT)

    # F7_s18 → F7_t17 (cut)
    with BuildSketch(Plane(origin=(7.375391582, -7.375391582, 7.375391582), x_dir=(0.7071067812, 0.7071067812, 0), z_dir=(0.5773502692, -0.5773502692, 0.5773502692))):
        Polygon((5.6717128827, -19.7958703189), (7.1957128827, -17.1034319795), (5.6717128827, -16.2235501693), (4.1477128827, -17.1034319795), align=None)
        Polygon((-5.6717128827, -19.7958703189), (-4.1477128827, -17.1034319795), (-5.6717128827, -16.2235501693), (-7.1957128827, -17.1034319795), align=None)
    extrude(amount=F7_T17_DEPTH, mode=Mode.SUBTRACT)

    # F7_s20 → F7_t19 (cut)
    with BuildSketch(Plane(origin=(-7.375391582, -7.375391582, 7.375391582), x_dir=(0.7071067812, -0.7071067812, 0), z_dir=(-0.5773502692, -0.5773502692, 0.5773502692))):
        Polygon((5.6717128827, -19.7958703189), (7.1957128827, -17.1034319795), (5.6717128827, -16.2235501693), (4.1477128827, -17.1034319795), align=None)
        Polygon((-5.6717128827, -19.7958703189), (-4.1477128827, -17.1034319795), (-5.6717128827, -16.2235501693), (-7.1957128827, -17.1034319795), align=None)
    extrude(amount=F7_T19_DEPTH, mode=Mode.SUBTRACT)

    # F7_s22 → F7_t21 (cut)
    with BuildSketch(Plane(origin=(-7.375391582, 7.375391582, 7.375391582), x_dir=(-0.7071067812, -0.7071067812, 0), z_dir=(-0.5773502692, 0.5773502692, 0.5773502692))):
        Polygon((-5.6717128827, -19.7958703189), (-7.1957128827, -17.1034319795), (-5.6717128827, -16.2235501693), (-4.1477128827, -17.1034319795), align=None)
        Polygon((5.6717128827, -19.7958703189), (4.1477128827, -17.1034319795), (5.6717128827, -16.2235501693), (7.1957128827, -17.1034319795), align=None)
    extrude(amount=F7_T21_DEPTH, mode=Mode.SUBTRACT)


with BuildPart() as f1_1:
    add(f1.part)

    # what is left inside the walls is the cavity
    f7_cavity = [f7_core1.part.solids().sort_by_distance(p)[0] for p in [
        (13.307835, 4.627326, -4.656667),
        (4.627326, 14.077617, -4.656667),
        (-4.627326, 13.307835, -4.656667),
        (14.077617, -4.627326, -4.656667),
        (4.627326, -14.077617, -4.656667),
        (-4.627326, -13.307835, -4.656667),
        (-14.077617, 4.627326, -4.656667),
        (-14.077617, -4.627326, -4.656667),
    ]]
    add(f7_cavity, mode=Mode.SUBTRACT)


solid = f1_1.part
